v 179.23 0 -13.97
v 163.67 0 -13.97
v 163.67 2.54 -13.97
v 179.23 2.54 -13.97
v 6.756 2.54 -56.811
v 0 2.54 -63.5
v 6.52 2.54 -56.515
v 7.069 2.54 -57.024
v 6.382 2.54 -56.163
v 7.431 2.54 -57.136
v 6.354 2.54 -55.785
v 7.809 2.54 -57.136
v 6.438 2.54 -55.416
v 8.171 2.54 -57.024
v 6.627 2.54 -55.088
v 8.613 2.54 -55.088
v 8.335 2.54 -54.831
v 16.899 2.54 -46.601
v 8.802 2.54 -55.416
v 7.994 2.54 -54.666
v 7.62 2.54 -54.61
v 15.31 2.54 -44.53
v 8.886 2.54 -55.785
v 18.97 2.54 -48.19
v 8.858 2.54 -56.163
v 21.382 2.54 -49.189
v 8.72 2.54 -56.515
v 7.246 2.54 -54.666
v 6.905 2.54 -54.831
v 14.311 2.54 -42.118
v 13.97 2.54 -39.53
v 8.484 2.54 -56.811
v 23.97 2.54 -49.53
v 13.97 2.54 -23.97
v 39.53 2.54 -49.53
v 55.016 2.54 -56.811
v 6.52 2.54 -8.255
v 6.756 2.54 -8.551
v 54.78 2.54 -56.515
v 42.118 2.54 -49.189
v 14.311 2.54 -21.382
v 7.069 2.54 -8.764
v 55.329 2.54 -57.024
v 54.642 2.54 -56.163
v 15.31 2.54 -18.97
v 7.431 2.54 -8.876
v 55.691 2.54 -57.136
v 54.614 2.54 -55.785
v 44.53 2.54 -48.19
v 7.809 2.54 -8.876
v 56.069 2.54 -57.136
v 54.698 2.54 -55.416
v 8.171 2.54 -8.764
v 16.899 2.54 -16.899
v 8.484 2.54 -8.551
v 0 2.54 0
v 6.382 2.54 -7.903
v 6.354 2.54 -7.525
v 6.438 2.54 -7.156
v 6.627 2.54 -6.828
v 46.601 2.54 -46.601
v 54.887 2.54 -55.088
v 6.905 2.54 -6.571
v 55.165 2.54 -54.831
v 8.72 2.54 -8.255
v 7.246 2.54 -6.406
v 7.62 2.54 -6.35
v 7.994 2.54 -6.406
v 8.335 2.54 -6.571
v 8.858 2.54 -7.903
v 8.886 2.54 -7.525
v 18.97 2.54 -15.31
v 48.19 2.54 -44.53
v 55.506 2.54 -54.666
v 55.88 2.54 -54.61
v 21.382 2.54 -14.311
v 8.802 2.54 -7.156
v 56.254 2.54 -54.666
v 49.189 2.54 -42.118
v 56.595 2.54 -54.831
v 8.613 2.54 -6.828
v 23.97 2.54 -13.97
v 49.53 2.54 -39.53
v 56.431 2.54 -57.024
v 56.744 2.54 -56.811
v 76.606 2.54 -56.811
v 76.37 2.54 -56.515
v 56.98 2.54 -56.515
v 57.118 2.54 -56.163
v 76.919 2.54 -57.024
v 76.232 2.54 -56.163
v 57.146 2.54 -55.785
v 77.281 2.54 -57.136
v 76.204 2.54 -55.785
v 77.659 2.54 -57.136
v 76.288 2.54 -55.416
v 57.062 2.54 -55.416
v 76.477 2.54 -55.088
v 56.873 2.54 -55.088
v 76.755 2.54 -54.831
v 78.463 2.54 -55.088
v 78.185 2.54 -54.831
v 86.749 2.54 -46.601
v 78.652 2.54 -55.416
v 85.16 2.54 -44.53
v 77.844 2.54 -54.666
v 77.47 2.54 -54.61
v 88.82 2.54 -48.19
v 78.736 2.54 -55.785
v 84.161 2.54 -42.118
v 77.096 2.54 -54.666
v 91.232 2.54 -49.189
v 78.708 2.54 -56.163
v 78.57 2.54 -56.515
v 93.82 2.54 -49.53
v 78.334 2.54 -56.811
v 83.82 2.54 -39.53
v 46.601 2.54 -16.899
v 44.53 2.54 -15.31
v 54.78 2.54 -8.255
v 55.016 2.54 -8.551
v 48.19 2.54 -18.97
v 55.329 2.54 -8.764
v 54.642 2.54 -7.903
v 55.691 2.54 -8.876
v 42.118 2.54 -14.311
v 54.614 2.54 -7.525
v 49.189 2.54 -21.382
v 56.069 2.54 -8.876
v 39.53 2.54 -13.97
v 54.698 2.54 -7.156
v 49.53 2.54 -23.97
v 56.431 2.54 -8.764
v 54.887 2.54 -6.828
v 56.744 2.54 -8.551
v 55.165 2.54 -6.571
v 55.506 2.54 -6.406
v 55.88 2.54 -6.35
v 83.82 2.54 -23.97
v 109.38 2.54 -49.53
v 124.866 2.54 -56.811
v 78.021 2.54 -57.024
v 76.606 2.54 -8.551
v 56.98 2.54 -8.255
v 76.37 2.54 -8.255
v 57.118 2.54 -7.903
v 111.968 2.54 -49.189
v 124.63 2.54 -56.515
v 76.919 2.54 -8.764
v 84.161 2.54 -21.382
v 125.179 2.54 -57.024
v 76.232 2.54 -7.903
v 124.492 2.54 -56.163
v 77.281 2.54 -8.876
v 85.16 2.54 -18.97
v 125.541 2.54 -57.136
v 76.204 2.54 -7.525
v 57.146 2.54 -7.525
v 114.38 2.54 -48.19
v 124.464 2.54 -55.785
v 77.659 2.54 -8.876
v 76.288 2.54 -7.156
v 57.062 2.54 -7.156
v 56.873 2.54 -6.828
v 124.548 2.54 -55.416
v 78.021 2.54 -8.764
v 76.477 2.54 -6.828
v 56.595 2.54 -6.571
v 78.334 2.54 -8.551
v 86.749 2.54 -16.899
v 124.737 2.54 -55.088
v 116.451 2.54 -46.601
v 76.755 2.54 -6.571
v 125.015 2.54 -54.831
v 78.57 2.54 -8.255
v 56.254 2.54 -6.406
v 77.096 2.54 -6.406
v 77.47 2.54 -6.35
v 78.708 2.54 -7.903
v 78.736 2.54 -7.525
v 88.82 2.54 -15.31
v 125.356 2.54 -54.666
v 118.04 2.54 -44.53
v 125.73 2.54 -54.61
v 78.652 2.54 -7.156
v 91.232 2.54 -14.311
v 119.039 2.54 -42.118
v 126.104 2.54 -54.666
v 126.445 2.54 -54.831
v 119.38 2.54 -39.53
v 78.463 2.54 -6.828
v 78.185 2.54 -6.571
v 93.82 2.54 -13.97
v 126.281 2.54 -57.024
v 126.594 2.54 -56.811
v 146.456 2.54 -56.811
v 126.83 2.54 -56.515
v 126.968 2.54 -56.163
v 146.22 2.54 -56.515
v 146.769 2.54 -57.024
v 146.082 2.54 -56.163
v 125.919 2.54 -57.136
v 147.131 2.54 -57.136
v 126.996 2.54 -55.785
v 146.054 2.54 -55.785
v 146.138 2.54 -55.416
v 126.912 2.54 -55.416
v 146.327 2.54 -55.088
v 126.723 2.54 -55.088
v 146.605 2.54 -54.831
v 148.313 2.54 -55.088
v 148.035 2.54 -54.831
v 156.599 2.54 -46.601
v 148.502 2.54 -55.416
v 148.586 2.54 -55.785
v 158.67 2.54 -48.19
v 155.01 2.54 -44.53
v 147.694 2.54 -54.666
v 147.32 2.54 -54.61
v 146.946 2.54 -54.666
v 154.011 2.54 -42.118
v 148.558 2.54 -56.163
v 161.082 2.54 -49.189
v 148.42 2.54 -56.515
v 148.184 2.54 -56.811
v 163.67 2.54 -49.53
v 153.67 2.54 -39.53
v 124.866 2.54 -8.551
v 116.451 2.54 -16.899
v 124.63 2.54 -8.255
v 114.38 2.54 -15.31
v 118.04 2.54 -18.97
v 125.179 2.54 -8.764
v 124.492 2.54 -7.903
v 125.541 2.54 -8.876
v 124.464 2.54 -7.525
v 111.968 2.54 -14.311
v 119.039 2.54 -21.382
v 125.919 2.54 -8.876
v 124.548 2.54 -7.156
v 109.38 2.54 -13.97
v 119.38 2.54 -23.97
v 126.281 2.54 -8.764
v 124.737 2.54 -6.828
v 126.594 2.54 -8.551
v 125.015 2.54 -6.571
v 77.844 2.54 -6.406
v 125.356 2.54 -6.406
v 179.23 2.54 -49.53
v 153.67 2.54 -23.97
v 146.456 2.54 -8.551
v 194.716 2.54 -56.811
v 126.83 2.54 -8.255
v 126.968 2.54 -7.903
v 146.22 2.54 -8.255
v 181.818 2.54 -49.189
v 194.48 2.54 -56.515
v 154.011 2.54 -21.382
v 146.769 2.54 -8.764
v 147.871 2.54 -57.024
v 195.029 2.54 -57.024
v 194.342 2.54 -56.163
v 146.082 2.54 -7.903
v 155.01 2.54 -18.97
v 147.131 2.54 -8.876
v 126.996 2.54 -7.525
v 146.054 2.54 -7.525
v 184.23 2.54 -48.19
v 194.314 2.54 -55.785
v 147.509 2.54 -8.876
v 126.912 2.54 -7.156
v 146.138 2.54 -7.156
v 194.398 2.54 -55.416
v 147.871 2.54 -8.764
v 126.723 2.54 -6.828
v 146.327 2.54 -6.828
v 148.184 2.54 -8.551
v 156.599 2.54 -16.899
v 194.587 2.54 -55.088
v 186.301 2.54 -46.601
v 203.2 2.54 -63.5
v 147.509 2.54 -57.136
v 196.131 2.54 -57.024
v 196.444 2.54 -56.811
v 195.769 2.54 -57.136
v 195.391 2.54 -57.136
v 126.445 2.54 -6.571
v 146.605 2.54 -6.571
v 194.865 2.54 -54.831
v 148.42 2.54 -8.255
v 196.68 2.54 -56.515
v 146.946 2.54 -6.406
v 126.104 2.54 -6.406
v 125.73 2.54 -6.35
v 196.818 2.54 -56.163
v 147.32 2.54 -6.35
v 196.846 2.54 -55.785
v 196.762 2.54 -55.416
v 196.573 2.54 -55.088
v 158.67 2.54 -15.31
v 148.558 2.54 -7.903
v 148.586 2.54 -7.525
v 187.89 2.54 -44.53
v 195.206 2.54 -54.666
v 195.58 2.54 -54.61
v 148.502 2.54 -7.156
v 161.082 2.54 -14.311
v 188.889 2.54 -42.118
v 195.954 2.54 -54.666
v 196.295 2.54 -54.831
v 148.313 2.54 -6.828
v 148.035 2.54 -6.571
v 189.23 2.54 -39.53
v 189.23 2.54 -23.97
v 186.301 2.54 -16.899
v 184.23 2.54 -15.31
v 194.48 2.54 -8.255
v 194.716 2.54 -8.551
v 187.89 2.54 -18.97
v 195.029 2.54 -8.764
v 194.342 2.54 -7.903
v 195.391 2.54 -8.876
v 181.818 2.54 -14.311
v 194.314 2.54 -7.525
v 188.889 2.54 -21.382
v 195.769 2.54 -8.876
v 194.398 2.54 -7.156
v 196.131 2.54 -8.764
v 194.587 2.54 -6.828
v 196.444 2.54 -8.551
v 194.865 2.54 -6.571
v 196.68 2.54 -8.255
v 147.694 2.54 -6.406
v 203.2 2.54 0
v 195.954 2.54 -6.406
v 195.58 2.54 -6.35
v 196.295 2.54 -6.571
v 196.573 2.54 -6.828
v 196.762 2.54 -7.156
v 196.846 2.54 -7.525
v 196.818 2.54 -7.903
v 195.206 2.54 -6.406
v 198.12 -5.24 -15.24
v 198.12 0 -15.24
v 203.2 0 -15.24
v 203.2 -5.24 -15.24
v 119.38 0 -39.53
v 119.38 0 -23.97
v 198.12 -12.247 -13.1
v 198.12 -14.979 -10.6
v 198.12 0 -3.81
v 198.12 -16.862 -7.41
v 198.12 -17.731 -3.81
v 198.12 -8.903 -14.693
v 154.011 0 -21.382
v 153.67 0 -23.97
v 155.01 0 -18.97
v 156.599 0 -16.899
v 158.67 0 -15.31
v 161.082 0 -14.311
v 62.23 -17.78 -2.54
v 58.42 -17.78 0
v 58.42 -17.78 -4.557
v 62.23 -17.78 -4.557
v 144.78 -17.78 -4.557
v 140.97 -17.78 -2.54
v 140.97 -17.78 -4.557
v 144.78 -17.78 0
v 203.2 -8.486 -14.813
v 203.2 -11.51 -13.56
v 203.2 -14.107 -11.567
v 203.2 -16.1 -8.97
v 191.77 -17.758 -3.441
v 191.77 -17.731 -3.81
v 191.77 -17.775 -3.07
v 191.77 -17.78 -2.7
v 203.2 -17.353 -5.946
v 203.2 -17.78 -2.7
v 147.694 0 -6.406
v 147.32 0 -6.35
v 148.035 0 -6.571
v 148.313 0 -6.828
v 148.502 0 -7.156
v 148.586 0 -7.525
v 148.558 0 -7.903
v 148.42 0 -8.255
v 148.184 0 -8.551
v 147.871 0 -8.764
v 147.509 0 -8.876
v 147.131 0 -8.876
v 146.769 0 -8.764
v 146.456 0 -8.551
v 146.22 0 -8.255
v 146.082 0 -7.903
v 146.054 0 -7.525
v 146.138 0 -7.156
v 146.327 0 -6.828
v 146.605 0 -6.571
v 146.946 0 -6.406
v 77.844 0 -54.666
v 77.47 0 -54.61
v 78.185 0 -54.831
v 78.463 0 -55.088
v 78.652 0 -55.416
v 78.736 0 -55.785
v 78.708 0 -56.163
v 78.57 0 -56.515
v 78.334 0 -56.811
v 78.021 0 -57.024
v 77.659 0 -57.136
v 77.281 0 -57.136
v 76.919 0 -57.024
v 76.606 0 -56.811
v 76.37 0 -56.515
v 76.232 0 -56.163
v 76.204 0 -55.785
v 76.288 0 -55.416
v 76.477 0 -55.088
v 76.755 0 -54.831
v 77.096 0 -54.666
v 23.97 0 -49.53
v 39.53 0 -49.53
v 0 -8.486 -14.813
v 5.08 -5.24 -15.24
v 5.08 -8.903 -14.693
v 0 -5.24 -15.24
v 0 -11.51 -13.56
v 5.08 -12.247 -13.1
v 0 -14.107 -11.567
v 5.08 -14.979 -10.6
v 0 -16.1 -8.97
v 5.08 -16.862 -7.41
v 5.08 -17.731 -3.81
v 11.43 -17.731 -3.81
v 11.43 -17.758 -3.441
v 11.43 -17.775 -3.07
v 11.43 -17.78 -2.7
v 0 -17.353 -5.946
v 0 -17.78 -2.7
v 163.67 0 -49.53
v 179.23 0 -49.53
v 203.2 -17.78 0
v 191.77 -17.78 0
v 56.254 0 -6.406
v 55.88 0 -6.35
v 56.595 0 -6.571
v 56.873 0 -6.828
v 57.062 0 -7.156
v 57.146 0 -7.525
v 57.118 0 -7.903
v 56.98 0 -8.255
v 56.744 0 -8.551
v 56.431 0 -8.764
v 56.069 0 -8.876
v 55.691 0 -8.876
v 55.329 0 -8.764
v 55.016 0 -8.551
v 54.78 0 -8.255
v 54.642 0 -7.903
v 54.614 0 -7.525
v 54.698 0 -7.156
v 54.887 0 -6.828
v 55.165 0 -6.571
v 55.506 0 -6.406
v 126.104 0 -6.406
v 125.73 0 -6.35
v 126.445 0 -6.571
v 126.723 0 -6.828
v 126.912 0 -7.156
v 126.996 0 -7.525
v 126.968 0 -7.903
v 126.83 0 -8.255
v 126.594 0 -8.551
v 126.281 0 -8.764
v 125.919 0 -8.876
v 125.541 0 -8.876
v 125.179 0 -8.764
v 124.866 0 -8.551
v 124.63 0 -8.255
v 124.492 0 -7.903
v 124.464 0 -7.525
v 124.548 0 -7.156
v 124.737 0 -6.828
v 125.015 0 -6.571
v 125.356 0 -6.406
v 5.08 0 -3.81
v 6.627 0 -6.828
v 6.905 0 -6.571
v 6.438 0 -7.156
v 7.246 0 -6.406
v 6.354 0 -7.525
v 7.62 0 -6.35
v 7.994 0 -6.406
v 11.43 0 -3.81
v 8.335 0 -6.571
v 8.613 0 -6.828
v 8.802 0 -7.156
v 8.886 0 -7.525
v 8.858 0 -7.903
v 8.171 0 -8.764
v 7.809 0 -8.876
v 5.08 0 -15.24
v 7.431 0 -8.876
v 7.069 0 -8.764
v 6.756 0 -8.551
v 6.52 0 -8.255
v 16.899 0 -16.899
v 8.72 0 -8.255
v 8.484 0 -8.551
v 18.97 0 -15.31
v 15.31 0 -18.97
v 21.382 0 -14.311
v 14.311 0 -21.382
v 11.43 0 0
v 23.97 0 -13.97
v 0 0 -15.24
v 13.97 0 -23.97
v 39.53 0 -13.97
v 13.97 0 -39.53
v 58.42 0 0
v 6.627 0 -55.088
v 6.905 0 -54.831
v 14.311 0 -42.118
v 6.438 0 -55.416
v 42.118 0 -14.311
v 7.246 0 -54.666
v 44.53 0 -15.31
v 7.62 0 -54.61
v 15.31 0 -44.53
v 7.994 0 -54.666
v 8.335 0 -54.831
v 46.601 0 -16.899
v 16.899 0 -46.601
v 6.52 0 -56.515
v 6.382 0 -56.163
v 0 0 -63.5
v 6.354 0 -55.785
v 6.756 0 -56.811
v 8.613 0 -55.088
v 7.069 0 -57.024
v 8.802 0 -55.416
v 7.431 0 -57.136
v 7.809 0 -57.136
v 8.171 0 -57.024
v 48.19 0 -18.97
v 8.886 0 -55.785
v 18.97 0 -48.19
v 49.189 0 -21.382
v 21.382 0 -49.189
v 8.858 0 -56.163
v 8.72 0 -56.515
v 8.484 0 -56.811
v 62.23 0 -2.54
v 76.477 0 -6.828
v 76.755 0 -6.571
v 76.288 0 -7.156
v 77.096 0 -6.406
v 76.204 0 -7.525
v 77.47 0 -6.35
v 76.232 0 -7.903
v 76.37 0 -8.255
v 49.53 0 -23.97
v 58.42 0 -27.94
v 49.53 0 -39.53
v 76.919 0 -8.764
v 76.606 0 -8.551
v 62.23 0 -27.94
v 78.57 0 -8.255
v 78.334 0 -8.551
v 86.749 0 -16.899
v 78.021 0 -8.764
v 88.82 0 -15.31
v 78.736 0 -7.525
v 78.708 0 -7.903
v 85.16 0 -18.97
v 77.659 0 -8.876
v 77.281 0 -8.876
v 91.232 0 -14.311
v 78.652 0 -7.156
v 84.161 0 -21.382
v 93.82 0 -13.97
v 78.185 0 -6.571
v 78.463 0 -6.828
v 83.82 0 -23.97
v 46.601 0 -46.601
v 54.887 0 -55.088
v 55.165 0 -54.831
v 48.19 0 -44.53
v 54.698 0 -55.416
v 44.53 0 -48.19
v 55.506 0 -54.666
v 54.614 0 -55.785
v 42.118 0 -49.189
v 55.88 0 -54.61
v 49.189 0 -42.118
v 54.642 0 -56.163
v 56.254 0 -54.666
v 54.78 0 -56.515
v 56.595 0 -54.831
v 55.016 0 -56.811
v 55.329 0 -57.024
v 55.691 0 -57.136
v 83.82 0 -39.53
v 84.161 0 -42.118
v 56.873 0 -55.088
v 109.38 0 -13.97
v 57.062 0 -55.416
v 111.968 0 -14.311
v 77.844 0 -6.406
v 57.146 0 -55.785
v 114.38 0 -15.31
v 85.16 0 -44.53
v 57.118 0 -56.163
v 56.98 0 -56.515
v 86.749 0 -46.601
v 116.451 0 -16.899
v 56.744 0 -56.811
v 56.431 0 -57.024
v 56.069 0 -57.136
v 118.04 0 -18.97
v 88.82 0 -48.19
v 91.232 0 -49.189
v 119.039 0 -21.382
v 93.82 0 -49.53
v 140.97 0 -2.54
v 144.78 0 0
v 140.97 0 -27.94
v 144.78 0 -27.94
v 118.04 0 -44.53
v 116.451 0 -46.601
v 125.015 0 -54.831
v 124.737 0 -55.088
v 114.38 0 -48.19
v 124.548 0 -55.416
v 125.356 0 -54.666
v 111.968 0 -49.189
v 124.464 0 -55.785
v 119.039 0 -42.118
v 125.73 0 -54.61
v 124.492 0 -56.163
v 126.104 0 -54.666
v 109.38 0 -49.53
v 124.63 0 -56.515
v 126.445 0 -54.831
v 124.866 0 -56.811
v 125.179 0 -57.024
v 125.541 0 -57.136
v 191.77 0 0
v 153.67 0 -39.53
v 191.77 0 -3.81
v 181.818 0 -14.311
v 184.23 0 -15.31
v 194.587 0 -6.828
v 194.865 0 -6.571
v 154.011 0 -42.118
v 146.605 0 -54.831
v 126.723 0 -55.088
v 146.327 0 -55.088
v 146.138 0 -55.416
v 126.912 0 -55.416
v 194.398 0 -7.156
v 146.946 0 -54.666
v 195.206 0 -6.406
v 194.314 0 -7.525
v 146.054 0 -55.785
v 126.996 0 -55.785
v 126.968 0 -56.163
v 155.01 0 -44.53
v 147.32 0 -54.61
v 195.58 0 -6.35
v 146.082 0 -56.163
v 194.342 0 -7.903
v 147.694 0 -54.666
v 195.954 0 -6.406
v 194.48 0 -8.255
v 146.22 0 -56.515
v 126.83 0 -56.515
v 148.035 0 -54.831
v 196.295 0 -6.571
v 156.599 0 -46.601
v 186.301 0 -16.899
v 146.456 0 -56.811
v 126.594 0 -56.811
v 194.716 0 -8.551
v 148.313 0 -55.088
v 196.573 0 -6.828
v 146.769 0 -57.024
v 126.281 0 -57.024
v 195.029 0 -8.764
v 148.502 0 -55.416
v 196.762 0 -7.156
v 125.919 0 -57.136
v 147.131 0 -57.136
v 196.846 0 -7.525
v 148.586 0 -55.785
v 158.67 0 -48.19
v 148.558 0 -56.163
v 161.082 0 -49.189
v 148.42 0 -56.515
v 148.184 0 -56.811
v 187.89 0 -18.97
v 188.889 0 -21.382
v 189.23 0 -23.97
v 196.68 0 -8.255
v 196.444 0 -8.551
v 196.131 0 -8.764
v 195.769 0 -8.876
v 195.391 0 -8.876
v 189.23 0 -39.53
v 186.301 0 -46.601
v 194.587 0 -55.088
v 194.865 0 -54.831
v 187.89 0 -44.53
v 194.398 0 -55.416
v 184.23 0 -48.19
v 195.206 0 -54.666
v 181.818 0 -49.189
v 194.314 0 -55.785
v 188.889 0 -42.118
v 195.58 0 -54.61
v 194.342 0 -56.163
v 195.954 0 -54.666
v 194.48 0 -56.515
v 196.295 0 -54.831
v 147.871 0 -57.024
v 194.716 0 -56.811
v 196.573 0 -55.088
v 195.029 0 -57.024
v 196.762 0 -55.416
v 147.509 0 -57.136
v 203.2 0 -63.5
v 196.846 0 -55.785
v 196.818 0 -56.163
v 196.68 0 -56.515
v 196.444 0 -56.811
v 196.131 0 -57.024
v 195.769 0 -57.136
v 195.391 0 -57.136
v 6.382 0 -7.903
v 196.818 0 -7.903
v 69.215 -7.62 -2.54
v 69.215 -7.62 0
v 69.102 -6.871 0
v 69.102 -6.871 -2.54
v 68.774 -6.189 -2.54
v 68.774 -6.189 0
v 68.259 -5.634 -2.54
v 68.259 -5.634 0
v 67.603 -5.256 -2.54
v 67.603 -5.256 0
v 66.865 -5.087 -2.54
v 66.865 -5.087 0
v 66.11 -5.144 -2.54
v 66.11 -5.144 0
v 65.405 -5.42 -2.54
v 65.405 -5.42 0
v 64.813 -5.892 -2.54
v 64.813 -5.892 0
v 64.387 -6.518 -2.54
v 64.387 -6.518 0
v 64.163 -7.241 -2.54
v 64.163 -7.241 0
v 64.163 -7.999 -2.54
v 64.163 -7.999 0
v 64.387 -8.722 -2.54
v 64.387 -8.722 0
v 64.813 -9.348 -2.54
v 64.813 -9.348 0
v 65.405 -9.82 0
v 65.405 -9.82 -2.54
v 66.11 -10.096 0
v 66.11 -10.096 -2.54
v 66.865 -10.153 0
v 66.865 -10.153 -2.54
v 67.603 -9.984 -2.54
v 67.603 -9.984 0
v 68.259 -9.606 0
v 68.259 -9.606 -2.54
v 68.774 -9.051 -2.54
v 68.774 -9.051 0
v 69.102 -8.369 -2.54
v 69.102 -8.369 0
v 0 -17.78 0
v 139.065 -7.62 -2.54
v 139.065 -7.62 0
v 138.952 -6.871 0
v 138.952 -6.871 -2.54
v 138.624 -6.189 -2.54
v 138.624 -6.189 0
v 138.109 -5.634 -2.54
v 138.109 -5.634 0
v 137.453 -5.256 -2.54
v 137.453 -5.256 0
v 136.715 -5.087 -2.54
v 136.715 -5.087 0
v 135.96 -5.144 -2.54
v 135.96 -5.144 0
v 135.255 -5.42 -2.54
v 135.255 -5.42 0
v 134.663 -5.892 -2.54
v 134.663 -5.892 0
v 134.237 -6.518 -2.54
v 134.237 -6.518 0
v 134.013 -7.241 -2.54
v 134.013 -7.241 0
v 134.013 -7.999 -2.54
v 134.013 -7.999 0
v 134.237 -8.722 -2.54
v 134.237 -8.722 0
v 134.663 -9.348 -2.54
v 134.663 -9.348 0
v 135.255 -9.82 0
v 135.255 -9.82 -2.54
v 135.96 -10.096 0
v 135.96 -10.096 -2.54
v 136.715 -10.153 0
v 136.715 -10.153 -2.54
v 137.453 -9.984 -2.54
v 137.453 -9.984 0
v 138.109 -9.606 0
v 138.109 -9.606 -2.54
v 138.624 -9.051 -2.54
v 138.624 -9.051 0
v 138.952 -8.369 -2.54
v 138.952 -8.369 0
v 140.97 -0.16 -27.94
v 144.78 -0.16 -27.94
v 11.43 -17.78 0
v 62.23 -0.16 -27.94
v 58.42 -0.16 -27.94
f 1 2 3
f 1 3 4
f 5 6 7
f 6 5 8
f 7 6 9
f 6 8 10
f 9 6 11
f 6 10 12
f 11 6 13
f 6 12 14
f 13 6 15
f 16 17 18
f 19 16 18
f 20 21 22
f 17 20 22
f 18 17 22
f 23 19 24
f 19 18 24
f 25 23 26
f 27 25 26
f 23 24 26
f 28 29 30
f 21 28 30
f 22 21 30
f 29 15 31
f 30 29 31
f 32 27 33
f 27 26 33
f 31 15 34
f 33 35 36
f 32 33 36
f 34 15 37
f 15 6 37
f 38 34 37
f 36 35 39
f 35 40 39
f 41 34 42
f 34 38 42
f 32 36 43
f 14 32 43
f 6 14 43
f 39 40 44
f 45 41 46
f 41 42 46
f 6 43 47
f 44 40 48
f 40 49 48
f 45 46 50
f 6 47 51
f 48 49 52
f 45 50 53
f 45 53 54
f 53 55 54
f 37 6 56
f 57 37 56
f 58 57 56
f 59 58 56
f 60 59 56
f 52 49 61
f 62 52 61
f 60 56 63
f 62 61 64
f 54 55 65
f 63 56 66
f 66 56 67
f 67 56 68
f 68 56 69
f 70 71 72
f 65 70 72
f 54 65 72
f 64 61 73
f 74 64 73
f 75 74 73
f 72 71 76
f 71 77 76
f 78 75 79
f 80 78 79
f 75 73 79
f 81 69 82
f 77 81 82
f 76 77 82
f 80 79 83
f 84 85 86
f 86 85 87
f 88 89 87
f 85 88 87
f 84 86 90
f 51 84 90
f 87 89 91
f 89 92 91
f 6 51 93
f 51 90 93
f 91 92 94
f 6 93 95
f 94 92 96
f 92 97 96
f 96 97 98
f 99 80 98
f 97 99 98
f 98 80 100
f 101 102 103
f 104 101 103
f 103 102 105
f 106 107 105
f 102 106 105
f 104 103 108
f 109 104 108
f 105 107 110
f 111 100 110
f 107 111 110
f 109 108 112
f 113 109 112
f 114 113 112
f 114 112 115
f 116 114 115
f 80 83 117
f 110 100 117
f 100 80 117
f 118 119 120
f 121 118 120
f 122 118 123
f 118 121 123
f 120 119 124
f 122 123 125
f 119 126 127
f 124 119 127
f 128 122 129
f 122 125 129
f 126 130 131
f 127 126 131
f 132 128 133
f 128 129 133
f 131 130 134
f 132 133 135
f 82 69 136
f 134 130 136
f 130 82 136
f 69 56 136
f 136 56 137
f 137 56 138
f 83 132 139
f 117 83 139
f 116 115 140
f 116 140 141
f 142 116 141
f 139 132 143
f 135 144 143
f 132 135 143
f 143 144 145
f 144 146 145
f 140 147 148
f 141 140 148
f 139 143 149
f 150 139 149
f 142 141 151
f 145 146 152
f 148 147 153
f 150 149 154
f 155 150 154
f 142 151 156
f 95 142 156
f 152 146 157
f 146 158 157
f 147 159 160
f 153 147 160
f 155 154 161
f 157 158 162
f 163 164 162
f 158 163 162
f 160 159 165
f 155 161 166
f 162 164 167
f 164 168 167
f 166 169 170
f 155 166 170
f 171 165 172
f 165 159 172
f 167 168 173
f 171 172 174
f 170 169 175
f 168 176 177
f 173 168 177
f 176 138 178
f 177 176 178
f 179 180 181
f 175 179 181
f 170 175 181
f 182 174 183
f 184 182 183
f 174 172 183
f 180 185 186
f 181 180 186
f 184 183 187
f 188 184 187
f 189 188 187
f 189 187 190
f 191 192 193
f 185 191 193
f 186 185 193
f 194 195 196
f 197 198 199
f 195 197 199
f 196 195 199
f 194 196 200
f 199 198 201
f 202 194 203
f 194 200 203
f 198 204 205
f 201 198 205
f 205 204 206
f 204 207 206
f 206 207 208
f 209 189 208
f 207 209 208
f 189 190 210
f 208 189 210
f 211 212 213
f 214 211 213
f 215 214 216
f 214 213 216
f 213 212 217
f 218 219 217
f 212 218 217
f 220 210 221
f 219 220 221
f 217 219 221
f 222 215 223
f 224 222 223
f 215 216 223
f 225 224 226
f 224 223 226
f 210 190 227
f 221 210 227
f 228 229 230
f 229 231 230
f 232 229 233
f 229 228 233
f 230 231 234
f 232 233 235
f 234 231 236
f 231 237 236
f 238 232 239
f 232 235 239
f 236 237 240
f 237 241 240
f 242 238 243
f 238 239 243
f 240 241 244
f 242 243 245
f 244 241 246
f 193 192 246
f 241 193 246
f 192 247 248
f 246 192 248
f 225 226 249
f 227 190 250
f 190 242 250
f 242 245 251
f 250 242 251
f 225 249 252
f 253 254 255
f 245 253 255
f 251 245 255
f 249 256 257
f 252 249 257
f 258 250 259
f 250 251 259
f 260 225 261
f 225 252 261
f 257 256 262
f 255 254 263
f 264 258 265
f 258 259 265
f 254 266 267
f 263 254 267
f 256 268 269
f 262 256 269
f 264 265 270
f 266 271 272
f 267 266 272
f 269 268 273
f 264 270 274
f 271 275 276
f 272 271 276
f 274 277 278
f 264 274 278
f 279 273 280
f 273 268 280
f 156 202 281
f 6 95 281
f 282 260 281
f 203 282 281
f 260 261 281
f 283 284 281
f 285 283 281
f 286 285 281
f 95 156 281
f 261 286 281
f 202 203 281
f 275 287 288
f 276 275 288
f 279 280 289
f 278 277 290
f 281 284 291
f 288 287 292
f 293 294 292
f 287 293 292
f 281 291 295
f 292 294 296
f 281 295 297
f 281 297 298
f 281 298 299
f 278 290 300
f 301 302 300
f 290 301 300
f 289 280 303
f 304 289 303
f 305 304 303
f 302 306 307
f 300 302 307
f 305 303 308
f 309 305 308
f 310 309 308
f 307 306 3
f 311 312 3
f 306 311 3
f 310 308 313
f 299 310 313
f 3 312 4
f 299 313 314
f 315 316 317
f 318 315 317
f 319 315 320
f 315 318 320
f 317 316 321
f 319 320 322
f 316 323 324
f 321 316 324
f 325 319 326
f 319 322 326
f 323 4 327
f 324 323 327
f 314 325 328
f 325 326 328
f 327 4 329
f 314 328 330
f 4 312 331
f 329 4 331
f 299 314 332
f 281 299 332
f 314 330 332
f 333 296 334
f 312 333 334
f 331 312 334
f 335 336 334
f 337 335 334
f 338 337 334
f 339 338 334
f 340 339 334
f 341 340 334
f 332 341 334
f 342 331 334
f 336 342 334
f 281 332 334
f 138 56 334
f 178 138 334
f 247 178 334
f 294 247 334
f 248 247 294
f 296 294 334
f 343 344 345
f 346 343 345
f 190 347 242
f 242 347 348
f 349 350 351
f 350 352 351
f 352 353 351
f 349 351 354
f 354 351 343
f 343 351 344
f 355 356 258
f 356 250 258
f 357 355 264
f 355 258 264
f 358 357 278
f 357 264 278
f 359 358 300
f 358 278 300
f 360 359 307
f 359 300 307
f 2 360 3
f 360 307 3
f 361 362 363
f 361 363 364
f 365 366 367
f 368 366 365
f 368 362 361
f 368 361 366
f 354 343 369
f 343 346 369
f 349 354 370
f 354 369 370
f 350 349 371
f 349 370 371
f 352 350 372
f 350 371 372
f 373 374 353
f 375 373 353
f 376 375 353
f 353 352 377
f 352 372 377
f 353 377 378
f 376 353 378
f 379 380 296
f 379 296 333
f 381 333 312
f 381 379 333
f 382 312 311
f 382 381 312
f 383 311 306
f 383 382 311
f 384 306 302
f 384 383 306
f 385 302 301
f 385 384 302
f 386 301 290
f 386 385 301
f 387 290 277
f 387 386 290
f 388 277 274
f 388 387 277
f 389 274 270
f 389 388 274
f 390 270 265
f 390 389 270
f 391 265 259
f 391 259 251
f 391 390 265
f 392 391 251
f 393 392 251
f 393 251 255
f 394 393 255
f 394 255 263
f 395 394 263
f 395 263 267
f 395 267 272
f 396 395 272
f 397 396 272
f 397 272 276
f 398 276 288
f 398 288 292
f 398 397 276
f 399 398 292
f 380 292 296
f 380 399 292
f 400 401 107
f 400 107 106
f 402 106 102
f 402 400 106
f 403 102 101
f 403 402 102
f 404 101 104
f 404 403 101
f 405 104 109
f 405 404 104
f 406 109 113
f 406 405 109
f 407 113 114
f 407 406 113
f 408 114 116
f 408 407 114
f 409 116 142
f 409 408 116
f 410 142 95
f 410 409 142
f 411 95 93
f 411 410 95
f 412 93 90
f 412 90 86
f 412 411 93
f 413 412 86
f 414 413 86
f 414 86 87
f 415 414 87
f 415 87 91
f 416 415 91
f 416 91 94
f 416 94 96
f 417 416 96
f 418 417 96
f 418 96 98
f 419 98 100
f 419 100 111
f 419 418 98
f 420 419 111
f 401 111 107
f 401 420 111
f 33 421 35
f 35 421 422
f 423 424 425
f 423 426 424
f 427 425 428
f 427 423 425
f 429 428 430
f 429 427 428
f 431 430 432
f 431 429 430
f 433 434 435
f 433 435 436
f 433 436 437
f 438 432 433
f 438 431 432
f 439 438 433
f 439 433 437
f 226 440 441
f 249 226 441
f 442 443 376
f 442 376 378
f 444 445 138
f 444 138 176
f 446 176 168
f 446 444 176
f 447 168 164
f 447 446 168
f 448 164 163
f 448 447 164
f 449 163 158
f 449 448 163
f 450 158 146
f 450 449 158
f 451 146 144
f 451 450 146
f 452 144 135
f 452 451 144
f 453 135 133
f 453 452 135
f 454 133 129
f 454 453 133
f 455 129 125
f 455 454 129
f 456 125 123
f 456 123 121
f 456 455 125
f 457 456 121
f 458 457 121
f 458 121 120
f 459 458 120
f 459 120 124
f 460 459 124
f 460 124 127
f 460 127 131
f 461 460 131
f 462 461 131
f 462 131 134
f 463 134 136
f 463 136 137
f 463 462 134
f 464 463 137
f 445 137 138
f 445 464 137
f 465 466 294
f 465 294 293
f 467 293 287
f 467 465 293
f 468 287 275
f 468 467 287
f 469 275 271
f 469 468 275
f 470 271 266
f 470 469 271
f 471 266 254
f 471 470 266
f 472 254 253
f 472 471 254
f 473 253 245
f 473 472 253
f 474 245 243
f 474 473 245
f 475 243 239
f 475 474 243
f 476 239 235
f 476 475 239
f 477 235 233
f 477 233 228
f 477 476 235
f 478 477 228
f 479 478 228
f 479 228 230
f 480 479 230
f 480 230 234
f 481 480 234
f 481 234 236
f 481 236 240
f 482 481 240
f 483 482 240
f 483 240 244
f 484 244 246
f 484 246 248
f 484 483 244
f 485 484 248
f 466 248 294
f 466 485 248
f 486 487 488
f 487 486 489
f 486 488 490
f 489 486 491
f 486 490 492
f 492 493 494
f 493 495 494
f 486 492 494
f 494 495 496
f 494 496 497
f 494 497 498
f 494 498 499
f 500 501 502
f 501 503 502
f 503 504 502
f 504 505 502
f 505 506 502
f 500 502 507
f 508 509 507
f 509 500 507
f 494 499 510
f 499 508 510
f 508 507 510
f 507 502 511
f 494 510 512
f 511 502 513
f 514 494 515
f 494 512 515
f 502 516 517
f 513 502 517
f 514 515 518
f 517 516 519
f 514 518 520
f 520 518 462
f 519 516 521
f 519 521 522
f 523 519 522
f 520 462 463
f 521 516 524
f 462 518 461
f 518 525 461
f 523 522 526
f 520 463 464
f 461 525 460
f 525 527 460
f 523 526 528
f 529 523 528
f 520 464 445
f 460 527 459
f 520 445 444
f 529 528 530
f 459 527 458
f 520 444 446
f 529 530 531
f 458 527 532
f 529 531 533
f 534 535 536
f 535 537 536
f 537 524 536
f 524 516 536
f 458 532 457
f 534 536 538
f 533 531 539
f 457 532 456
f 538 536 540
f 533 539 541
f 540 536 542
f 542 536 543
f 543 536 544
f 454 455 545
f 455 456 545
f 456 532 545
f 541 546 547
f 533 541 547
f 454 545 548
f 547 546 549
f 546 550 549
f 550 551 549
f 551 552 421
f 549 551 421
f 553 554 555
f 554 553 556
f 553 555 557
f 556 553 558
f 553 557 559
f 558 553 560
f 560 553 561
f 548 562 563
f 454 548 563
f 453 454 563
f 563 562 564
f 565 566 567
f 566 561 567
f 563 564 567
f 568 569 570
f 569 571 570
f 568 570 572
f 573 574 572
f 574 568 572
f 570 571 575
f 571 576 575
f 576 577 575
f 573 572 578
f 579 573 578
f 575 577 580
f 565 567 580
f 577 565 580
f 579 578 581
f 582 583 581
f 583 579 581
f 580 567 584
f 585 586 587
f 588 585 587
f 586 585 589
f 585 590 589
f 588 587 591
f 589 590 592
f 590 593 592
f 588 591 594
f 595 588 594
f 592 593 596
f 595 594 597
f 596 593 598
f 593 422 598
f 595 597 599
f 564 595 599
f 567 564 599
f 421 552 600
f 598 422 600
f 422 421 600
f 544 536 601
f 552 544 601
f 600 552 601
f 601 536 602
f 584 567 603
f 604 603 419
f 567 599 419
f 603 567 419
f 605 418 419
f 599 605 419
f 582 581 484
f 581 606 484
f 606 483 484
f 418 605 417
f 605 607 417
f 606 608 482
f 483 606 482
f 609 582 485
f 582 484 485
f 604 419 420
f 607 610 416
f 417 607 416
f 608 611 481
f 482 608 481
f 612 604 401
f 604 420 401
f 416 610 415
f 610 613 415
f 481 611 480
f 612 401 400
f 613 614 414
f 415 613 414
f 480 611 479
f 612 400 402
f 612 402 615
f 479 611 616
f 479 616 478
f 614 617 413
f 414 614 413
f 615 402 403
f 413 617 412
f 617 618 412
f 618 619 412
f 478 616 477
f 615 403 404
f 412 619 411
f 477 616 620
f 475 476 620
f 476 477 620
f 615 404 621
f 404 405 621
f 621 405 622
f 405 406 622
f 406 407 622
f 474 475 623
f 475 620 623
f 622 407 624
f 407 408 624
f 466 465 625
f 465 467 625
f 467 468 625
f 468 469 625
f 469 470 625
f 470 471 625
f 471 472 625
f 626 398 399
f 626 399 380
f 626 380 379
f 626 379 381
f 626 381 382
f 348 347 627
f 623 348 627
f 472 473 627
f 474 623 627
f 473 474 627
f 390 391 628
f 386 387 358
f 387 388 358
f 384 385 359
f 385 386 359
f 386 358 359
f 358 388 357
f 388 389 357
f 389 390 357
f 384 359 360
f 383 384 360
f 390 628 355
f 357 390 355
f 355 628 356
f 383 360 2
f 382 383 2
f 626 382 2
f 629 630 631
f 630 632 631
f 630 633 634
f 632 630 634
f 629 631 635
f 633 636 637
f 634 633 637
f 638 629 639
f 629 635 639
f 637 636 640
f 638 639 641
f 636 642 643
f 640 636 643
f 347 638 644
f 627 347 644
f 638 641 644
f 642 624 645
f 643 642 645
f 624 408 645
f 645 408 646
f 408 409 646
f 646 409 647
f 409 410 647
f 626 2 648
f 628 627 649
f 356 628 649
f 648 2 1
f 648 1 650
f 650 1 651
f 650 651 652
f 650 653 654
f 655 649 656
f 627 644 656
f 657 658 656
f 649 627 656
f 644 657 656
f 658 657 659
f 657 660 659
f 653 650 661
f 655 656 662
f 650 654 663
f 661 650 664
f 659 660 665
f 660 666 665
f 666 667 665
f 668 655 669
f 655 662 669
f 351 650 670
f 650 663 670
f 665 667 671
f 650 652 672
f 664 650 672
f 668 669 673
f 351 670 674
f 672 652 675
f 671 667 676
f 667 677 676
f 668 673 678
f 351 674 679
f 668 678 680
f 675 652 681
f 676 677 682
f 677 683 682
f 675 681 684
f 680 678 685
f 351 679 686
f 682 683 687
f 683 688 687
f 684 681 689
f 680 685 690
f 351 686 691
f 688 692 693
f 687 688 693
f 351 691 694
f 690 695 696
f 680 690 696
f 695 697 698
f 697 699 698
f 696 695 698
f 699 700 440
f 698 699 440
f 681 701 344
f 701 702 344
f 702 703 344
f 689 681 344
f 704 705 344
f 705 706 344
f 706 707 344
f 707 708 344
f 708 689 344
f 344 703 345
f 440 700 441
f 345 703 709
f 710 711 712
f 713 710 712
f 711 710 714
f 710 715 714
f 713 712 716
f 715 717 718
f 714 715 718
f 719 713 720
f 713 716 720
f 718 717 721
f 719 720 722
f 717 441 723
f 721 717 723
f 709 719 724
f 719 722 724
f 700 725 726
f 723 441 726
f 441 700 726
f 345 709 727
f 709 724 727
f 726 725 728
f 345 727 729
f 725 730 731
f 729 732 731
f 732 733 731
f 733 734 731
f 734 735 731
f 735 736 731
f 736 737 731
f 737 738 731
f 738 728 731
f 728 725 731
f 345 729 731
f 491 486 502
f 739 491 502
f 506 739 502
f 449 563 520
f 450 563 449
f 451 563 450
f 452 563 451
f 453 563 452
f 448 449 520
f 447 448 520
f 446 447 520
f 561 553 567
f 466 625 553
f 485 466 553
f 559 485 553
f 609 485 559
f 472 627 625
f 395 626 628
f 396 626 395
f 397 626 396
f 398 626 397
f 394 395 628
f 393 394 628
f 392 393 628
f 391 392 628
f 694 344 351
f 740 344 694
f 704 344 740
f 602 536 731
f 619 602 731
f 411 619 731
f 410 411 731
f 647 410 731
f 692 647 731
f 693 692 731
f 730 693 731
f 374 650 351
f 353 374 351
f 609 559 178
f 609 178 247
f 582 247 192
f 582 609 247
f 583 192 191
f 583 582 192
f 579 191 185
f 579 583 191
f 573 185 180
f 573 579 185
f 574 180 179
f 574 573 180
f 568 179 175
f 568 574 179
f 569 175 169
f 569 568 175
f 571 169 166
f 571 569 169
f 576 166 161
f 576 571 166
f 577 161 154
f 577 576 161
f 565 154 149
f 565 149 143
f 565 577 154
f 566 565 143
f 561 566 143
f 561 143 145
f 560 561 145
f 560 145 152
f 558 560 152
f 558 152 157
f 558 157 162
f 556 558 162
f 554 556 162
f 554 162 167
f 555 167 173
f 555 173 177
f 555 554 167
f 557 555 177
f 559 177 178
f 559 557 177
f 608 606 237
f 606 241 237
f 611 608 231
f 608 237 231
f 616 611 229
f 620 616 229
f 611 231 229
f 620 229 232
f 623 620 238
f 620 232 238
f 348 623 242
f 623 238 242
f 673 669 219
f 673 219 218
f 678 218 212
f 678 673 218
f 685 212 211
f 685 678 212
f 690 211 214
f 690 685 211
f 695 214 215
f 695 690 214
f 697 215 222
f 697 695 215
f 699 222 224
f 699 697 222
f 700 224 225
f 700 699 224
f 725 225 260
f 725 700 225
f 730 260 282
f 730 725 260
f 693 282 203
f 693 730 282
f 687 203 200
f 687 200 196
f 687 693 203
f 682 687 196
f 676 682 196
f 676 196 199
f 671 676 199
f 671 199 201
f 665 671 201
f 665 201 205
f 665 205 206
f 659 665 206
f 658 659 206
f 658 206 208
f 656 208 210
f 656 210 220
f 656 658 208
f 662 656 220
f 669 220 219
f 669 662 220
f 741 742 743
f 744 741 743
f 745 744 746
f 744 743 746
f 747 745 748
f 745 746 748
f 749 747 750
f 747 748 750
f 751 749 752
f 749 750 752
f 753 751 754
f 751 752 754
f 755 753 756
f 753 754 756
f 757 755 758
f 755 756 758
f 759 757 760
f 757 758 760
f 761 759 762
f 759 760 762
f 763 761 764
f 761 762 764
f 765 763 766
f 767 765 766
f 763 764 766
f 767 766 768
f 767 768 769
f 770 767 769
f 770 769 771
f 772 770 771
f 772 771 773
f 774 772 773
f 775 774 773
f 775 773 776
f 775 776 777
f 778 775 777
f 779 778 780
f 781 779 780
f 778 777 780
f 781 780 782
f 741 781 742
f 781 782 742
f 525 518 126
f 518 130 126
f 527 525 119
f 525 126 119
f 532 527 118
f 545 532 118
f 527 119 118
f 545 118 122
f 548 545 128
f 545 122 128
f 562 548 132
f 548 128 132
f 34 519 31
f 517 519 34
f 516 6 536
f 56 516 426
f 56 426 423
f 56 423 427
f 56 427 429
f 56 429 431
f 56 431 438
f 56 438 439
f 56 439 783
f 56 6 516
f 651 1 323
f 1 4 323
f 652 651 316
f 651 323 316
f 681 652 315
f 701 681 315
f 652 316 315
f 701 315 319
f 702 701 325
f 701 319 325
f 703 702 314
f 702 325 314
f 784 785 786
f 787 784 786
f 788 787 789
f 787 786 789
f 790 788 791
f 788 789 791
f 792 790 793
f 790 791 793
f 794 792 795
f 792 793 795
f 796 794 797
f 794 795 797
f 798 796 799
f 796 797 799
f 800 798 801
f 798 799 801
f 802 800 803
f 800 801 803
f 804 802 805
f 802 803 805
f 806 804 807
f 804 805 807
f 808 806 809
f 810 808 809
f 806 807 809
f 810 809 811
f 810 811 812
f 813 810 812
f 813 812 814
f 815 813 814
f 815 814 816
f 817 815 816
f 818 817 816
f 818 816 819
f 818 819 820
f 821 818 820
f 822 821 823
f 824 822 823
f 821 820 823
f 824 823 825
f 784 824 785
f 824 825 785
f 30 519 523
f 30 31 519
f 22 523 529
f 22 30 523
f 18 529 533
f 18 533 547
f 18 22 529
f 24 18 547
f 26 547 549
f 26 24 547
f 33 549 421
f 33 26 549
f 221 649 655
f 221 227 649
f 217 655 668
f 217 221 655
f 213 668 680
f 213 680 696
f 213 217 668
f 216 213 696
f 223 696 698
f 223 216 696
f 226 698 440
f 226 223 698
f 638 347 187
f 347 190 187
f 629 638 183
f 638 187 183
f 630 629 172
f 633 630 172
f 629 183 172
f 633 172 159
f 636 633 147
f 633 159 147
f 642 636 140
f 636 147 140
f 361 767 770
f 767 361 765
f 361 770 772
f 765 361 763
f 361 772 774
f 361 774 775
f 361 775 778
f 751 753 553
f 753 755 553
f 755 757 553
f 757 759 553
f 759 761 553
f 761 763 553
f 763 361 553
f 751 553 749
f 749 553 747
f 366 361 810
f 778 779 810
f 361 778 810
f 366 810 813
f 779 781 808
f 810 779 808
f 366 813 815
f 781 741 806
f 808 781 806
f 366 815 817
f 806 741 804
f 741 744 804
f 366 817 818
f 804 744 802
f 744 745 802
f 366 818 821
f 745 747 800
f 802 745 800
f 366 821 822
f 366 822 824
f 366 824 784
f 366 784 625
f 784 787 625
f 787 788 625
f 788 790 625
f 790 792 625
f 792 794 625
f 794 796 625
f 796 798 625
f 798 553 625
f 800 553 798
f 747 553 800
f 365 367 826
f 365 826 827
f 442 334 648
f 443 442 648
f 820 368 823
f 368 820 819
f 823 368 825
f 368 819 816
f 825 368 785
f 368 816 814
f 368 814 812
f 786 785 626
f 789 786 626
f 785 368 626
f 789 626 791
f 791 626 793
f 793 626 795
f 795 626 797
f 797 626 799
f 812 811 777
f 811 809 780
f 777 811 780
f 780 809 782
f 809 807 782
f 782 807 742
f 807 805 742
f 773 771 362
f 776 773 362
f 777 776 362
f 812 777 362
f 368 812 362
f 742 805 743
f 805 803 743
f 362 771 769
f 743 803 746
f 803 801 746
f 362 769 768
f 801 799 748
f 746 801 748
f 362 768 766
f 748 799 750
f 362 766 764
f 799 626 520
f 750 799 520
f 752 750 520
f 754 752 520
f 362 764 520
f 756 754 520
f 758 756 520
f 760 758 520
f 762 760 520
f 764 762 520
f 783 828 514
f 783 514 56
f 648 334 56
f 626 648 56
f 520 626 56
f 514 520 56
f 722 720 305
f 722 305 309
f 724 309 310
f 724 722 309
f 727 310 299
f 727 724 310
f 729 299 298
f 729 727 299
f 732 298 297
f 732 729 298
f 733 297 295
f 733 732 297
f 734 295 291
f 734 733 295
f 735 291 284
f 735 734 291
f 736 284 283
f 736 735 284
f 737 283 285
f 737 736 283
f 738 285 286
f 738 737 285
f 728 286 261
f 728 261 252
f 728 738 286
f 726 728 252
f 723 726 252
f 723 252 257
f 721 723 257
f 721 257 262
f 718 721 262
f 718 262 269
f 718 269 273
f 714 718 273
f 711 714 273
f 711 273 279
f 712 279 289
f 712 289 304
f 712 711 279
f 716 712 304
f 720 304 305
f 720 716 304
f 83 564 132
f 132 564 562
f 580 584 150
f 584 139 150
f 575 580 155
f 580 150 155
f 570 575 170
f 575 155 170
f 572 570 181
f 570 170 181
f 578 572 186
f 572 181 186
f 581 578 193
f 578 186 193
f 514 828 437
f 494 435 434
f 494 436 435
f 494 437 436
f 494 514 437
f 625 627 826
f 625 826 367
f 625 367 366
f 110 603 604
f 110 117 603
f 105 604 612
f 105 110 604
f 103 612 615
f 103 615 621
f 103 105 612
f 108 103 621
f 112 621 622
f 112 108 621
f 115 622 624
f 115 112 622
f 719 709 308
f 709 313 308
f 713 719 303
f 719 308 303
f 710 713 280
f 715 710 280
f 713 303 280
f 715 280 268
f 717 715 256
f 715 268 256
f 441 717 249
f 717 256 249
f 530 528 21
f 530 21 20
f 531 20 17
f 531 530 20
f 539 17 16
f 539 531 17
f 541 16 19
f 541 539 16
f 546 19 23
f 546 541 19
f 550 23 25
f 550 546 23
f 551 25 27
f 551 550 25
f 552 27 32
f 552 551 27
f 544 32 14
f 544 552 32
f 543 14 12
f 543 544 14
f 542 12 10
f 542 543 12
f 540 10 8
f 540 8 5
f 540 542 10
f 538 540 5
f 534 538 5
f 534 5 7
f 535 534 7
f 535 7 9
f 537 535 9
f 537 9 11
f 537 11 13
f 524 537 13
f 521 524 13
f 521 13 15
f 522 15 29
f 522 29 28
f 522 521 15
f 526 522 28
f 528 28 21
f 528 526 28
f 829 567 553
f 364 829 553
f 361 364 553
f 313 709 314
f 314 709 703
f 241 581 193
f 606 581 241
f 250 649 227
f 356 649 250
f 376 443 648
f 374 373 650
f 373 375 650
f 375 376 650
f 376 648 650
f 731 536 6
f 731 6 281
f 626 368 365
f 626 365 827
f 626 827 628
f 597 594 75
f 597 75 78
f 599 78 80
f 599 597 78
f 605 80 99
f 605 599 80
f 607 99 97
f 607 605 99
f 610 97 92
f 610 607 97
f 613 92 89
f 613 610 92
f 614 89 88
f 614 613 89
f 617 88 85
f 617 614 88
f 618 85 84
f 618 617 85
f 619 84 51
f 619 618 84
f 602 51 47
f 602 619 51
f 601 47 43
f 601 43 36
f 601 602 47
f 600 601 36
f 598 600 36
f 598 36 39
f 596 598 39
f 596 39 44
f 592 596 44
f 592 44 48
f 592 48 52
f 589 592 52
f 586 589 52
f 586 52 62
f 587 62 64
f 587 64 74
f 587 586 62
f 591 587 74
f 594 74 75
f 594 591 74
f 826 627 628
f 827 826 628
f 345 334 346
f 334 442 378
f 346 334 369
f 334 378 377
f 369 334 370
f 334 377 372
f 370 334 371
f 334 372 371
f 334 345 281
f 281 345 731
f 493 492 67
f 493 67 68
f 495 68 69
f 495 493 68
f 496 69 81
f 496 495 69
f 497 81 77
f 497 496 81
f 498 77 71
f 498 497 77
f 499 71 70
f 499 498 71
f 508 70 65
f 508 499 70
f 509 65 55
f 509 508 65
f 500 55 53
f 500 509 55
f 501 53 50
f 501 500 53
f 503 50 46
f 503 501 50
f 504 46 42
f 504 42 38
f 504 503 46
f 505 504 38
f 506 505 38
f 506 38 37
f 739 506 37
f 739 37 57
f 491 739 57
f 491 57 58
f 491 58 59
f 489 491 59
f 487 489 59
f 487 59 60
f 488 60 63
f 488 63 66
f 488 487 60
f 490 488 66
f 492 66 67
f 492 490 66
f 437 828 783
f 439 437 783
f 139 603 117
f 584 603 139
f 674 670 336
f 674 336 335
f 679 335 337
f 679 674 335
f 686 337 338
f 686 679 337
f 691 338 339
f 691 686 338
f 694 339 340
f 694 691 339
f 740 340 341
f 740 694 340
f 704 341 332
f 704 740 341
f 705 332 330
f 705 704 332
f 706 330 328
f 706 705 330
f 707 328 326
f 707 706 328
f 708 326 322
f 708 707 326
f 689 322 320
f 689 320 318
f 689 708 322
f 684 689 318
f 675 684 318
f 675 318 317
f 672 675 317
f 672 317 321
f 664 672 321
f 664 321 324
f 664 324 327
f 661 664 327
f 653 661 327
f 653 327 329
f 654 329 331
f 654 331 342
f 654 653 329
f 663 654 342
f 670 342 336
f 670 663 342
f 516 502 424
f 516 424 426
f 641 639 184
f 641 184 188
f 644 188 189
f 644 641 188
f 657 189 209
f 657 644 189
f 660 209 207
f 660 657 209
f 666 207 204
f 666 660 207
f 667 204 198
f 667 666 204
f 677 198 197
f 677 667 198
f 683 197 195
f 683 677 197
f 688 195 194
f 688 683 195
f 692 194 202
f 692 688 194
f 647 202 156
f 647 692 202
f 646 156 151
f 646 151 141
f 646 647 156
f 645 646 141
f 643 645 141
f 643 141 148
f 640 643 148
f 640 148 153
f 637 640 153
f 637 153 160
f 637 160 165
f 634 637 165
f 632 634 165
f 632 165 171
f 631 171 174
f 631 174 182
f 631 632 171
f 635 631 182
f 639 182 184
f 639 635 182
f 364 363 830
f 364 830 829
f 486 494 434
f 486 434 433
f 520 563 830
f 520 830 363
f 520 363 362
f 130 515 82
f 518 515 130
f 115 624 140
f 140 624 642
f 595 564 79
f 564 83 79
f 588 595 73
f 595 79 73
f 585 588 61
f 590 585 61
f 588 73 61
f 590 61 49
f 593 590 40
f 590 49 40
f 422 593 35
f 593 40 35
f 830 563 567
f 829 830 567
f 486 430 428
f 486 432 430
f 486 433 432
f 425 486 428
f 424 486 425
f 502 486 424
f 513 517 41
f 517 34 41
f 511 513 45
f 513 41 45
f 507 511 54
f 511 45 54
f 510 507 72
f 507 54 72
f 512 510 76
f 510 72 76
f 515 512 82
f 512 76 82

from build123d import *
from OCP.BRepFilletAPI import BRepFilletAPI_MakeChamfer

# Parameters (mm, degrees)
SKETCH1_W           = 203.2
SKETCH1_H           = 63.5
SKETCH1_R           = 1.27
BOSS_EXTRUDE1_DEPTH = 2.54
SKETCH2_W           = 86.36
SKETCH2_H           = 20.32
SKETCH2_R           = 2.54
BOSS_EXTRUDE2_DEPTH = 2.54
SKETCH3_W           = 3.81
SKETCH3_H           = 25.4
BOSS_EXTRUDE3_DEPTH = 17.78
CHAMFER1_SIZE       = 17.62
CHAMFER1_SIZE2      = 23.382529757
SKETCH4_W           = 35.56
SKETCH4_H           = 35.56
CUT_EXTRUDE1_DEPTH  = 214.631969518
FILLET1_R           = 10
BOSS_EXTRUDE4_DEPTH = 17.78
FILLET2_R           = 12.54


with BuildPart() as part:
    # Sketch1 → Boss-Extrude1 (new body)
    with BuildSketch(Plane(origin=(0, 0, 0), x_dir=(1, 0, 0), z_dir=(0, 1, 0))):
        with Locations((101.6, 31.75)):
            Rectangle(SKETCH1_W, SKETCH1_H)
        with Locations(Location((7.62, 55.88, 0), (0, 0, 270))):
            Circle(SKETCH1_R, mode=Mode.SUBTRACT)
        with Locations(Location((55.88, 55.88, 0), (0, 0, 270))):
            Circle(SKETCH1_R, mode=Mode.SUBTRACT)
        with Locations(Location((7.62, 7.62, 0), (0, 0, 270))):
            Circle(SKETCH1_R, mode=Mode.SUBTRACT)
        with Locations(Location((55.88, 7.62, 0), (0, 0, 270))):
            Circle(SKETCH1_R, mode=Mode.SUBTRACT)
        with Locations(Location((77.47, 55.88, 0), (0, 0, 270))):
            Circle(SKETCH1_R, mode=Mode.SUBTRACT)
        with Locations(Location((125.73, 55.88, 0), (0, 0, 270))):
            Circle(SKETCH1_R, mode=Mode.SUBTRACT)
        with Locations(Location((125.73, 7.62, 0), (0, 0, 270))):
            Circle(SKETCH1_R, mode=Mode.SUBTRACT)
        with Locations(Location((77.47, 7.62, 0), (0, 0, 270))):
            Circle(SKETCH1_R, mode=Mode.SUBTRACT)
        with Locations(Location((147.32, 55.88, 0), (0, 0, 270))):
            Circle(SKETCH1_R, mode=Mode.SUBTRACT)
        with Locations(Location((195.58, 55.88, 0), (0, 0, 270))):
            Circle(SKETCH1_R, mode=Mode.SUBTRACT)
        with Locations(Location((195.58, 7.62, 0), (0, 0, 270))):
            Circle(SKETCH1_R, mode=Mode.SUBTRACT)
        with Locations(Location((147.32, 7.62, 0), (0, 0, 270))):
            Circle(SKETCH1_R, mode=Mode.SUBTRACT)
    extrude(amount=BOSS_EXTRUDE1_DEPTH)

    # Sketch2 → Boss-Extrude2 (add)
    with BuildSketch(Plane.XY):
        with Locations((101.6, -7.62)):
            Rectangle(SKETCH2_W, SKETCH2_H)
        with Locations((66.675, -7.62)):
            Circle(SKETCH2_R, mode=Mode.SUBTRACT)
        with Locations((136.525, -7.62)):
            Circle(SKETCH2_R, mode=Mode.SUBTRACT)
    extrude(amount=-BOSS_EXTRUDE2_DEPTH)

    # Sketch3 → Boss-Extrude3 (add)
    with BuildSketch(Plane.XZ):
        with Locations((60.325, -15.24)):
            Rectangle(SKETCH3_W, SKETCH3_H)
        with Locations((142.875, -15.24)):
            Rectangle(SKETCH3_W, SKETCH3_H)
    extrude(amount=BOSS_EXTRUDE3_DEPTH)

    # Chamfer1: one chamfer whose edges measure the first distance from different faces: ONE call of the kernel's chamfer builder (chamfer() names one face for all edges)
    chamfer1_edges_1 = [part.edges().sort_by_distance(p)[0] for p in [
        (142.875, -17.78, -27.94),
    ]]
    chamfer1_side_1 = [part.faces().sort_by_distance(p)[0] for p in [
        (142.875, -8.89, -27.94),
    ]]
    chamfer1_edges_2 = [part.edges().sort_by_distance(p)[0] for p in [
        (60.325, -17.78, -27.94),
    ]]
    chamfer1_side_2 = [part.faces().sort_by_distance(p)[0] for p in [
        (60.325, -8.89, -27.94),
    ]]
    chamfer1 = BRepFilletAPI_MakeChamfer(part.part.solid().wrapped)
    for e in chamfer1_edges_1:
        chamfer1.Add(CHAMFER1_SIZE, CHAMFER1_SIZE2, e.wrapped, chamfer1_side_1[0].wrapped)  # the first distance lies on this face
    for e in chamfer1_edges_2:
        chamfer1.Add(CHAMFER1_SIZE, CHAMFER1_SIZE2, e.wrapped, chamfer1_side_2[0].wrapped)  # the first distance lies on this face
    add(Compound.cast(chamfer1.Shape()), mode=Mode.REPLACE)

    # Sketch4 → Cut-Extrude1 (cut, through all)
    with BuildSketch(Plane.XZ):
        with Locations((31.75, -31.75)):
            Rectangle(SKETCH4_W, SKETCH4_H)
        with Locations((101.6, -31.75)):
            Rectangle(SKETCH4_W, SKETCH4_H)
        with Locations((171.45, -31.75)):
            Rectangle(SKETCH4_W, SKETCH4_H)
    extrude(amount=-CUT_EXTRUDE1_DEPTH, mode=Mode.SUBTRACT)

    # Fillet1
    fillet1_edges = [part.edges().sort_by_distance(p)[0] for p in [
        (13.97, 1.27, -49.53),
        (13.97, 1.27, -13.97),
        (49.53, 1.27, -13.97),
        (49.53, 1.27, -49.53),
        (83.82, 1.27, -49.53),
        (83.82, 1.27, -13.97),
        (119.38, 1.27, -13.97),
        (119.38, 1.27, -49.53),
        (153.67, 1.27, -49.53),
        (153.67, 1.27, -13.97),
        (189.23, 1.27, -13.97),
        (189.23, 1.27, -49.53),
    ]]
    fillet(fillet1_edges, radius=FILLET1_R)

    # Sketch5 → Boss-Extrude4 (add)
    with BuildSketch(Plane.XZ):
        Polygon((0, 0), (5.08, 0), (11.43, 0), (11.43, -3.81), (5.08, -3.81), (5.08, -15.24), (0, -15.24), align=None)
        Polygon((203.2, 0), (191.77, 0), (191.77, -3.81), (198.12, -3.81), (198.12, -15.24), (203.2, -15.24), align=None)
    extrude(amount=BOSS_EXTRUDE4_DEPTH)

    # Fillet2
    fillet2_edges = [part.edges().sort_by_distance(p)[0] for p in [
        (200.66, -17.78, -15.24),
        (2.54, -17.78, -15.24),
    ]]
    fillet(fillet2_edges, radius=FILLET2_R)


solid = part.part
